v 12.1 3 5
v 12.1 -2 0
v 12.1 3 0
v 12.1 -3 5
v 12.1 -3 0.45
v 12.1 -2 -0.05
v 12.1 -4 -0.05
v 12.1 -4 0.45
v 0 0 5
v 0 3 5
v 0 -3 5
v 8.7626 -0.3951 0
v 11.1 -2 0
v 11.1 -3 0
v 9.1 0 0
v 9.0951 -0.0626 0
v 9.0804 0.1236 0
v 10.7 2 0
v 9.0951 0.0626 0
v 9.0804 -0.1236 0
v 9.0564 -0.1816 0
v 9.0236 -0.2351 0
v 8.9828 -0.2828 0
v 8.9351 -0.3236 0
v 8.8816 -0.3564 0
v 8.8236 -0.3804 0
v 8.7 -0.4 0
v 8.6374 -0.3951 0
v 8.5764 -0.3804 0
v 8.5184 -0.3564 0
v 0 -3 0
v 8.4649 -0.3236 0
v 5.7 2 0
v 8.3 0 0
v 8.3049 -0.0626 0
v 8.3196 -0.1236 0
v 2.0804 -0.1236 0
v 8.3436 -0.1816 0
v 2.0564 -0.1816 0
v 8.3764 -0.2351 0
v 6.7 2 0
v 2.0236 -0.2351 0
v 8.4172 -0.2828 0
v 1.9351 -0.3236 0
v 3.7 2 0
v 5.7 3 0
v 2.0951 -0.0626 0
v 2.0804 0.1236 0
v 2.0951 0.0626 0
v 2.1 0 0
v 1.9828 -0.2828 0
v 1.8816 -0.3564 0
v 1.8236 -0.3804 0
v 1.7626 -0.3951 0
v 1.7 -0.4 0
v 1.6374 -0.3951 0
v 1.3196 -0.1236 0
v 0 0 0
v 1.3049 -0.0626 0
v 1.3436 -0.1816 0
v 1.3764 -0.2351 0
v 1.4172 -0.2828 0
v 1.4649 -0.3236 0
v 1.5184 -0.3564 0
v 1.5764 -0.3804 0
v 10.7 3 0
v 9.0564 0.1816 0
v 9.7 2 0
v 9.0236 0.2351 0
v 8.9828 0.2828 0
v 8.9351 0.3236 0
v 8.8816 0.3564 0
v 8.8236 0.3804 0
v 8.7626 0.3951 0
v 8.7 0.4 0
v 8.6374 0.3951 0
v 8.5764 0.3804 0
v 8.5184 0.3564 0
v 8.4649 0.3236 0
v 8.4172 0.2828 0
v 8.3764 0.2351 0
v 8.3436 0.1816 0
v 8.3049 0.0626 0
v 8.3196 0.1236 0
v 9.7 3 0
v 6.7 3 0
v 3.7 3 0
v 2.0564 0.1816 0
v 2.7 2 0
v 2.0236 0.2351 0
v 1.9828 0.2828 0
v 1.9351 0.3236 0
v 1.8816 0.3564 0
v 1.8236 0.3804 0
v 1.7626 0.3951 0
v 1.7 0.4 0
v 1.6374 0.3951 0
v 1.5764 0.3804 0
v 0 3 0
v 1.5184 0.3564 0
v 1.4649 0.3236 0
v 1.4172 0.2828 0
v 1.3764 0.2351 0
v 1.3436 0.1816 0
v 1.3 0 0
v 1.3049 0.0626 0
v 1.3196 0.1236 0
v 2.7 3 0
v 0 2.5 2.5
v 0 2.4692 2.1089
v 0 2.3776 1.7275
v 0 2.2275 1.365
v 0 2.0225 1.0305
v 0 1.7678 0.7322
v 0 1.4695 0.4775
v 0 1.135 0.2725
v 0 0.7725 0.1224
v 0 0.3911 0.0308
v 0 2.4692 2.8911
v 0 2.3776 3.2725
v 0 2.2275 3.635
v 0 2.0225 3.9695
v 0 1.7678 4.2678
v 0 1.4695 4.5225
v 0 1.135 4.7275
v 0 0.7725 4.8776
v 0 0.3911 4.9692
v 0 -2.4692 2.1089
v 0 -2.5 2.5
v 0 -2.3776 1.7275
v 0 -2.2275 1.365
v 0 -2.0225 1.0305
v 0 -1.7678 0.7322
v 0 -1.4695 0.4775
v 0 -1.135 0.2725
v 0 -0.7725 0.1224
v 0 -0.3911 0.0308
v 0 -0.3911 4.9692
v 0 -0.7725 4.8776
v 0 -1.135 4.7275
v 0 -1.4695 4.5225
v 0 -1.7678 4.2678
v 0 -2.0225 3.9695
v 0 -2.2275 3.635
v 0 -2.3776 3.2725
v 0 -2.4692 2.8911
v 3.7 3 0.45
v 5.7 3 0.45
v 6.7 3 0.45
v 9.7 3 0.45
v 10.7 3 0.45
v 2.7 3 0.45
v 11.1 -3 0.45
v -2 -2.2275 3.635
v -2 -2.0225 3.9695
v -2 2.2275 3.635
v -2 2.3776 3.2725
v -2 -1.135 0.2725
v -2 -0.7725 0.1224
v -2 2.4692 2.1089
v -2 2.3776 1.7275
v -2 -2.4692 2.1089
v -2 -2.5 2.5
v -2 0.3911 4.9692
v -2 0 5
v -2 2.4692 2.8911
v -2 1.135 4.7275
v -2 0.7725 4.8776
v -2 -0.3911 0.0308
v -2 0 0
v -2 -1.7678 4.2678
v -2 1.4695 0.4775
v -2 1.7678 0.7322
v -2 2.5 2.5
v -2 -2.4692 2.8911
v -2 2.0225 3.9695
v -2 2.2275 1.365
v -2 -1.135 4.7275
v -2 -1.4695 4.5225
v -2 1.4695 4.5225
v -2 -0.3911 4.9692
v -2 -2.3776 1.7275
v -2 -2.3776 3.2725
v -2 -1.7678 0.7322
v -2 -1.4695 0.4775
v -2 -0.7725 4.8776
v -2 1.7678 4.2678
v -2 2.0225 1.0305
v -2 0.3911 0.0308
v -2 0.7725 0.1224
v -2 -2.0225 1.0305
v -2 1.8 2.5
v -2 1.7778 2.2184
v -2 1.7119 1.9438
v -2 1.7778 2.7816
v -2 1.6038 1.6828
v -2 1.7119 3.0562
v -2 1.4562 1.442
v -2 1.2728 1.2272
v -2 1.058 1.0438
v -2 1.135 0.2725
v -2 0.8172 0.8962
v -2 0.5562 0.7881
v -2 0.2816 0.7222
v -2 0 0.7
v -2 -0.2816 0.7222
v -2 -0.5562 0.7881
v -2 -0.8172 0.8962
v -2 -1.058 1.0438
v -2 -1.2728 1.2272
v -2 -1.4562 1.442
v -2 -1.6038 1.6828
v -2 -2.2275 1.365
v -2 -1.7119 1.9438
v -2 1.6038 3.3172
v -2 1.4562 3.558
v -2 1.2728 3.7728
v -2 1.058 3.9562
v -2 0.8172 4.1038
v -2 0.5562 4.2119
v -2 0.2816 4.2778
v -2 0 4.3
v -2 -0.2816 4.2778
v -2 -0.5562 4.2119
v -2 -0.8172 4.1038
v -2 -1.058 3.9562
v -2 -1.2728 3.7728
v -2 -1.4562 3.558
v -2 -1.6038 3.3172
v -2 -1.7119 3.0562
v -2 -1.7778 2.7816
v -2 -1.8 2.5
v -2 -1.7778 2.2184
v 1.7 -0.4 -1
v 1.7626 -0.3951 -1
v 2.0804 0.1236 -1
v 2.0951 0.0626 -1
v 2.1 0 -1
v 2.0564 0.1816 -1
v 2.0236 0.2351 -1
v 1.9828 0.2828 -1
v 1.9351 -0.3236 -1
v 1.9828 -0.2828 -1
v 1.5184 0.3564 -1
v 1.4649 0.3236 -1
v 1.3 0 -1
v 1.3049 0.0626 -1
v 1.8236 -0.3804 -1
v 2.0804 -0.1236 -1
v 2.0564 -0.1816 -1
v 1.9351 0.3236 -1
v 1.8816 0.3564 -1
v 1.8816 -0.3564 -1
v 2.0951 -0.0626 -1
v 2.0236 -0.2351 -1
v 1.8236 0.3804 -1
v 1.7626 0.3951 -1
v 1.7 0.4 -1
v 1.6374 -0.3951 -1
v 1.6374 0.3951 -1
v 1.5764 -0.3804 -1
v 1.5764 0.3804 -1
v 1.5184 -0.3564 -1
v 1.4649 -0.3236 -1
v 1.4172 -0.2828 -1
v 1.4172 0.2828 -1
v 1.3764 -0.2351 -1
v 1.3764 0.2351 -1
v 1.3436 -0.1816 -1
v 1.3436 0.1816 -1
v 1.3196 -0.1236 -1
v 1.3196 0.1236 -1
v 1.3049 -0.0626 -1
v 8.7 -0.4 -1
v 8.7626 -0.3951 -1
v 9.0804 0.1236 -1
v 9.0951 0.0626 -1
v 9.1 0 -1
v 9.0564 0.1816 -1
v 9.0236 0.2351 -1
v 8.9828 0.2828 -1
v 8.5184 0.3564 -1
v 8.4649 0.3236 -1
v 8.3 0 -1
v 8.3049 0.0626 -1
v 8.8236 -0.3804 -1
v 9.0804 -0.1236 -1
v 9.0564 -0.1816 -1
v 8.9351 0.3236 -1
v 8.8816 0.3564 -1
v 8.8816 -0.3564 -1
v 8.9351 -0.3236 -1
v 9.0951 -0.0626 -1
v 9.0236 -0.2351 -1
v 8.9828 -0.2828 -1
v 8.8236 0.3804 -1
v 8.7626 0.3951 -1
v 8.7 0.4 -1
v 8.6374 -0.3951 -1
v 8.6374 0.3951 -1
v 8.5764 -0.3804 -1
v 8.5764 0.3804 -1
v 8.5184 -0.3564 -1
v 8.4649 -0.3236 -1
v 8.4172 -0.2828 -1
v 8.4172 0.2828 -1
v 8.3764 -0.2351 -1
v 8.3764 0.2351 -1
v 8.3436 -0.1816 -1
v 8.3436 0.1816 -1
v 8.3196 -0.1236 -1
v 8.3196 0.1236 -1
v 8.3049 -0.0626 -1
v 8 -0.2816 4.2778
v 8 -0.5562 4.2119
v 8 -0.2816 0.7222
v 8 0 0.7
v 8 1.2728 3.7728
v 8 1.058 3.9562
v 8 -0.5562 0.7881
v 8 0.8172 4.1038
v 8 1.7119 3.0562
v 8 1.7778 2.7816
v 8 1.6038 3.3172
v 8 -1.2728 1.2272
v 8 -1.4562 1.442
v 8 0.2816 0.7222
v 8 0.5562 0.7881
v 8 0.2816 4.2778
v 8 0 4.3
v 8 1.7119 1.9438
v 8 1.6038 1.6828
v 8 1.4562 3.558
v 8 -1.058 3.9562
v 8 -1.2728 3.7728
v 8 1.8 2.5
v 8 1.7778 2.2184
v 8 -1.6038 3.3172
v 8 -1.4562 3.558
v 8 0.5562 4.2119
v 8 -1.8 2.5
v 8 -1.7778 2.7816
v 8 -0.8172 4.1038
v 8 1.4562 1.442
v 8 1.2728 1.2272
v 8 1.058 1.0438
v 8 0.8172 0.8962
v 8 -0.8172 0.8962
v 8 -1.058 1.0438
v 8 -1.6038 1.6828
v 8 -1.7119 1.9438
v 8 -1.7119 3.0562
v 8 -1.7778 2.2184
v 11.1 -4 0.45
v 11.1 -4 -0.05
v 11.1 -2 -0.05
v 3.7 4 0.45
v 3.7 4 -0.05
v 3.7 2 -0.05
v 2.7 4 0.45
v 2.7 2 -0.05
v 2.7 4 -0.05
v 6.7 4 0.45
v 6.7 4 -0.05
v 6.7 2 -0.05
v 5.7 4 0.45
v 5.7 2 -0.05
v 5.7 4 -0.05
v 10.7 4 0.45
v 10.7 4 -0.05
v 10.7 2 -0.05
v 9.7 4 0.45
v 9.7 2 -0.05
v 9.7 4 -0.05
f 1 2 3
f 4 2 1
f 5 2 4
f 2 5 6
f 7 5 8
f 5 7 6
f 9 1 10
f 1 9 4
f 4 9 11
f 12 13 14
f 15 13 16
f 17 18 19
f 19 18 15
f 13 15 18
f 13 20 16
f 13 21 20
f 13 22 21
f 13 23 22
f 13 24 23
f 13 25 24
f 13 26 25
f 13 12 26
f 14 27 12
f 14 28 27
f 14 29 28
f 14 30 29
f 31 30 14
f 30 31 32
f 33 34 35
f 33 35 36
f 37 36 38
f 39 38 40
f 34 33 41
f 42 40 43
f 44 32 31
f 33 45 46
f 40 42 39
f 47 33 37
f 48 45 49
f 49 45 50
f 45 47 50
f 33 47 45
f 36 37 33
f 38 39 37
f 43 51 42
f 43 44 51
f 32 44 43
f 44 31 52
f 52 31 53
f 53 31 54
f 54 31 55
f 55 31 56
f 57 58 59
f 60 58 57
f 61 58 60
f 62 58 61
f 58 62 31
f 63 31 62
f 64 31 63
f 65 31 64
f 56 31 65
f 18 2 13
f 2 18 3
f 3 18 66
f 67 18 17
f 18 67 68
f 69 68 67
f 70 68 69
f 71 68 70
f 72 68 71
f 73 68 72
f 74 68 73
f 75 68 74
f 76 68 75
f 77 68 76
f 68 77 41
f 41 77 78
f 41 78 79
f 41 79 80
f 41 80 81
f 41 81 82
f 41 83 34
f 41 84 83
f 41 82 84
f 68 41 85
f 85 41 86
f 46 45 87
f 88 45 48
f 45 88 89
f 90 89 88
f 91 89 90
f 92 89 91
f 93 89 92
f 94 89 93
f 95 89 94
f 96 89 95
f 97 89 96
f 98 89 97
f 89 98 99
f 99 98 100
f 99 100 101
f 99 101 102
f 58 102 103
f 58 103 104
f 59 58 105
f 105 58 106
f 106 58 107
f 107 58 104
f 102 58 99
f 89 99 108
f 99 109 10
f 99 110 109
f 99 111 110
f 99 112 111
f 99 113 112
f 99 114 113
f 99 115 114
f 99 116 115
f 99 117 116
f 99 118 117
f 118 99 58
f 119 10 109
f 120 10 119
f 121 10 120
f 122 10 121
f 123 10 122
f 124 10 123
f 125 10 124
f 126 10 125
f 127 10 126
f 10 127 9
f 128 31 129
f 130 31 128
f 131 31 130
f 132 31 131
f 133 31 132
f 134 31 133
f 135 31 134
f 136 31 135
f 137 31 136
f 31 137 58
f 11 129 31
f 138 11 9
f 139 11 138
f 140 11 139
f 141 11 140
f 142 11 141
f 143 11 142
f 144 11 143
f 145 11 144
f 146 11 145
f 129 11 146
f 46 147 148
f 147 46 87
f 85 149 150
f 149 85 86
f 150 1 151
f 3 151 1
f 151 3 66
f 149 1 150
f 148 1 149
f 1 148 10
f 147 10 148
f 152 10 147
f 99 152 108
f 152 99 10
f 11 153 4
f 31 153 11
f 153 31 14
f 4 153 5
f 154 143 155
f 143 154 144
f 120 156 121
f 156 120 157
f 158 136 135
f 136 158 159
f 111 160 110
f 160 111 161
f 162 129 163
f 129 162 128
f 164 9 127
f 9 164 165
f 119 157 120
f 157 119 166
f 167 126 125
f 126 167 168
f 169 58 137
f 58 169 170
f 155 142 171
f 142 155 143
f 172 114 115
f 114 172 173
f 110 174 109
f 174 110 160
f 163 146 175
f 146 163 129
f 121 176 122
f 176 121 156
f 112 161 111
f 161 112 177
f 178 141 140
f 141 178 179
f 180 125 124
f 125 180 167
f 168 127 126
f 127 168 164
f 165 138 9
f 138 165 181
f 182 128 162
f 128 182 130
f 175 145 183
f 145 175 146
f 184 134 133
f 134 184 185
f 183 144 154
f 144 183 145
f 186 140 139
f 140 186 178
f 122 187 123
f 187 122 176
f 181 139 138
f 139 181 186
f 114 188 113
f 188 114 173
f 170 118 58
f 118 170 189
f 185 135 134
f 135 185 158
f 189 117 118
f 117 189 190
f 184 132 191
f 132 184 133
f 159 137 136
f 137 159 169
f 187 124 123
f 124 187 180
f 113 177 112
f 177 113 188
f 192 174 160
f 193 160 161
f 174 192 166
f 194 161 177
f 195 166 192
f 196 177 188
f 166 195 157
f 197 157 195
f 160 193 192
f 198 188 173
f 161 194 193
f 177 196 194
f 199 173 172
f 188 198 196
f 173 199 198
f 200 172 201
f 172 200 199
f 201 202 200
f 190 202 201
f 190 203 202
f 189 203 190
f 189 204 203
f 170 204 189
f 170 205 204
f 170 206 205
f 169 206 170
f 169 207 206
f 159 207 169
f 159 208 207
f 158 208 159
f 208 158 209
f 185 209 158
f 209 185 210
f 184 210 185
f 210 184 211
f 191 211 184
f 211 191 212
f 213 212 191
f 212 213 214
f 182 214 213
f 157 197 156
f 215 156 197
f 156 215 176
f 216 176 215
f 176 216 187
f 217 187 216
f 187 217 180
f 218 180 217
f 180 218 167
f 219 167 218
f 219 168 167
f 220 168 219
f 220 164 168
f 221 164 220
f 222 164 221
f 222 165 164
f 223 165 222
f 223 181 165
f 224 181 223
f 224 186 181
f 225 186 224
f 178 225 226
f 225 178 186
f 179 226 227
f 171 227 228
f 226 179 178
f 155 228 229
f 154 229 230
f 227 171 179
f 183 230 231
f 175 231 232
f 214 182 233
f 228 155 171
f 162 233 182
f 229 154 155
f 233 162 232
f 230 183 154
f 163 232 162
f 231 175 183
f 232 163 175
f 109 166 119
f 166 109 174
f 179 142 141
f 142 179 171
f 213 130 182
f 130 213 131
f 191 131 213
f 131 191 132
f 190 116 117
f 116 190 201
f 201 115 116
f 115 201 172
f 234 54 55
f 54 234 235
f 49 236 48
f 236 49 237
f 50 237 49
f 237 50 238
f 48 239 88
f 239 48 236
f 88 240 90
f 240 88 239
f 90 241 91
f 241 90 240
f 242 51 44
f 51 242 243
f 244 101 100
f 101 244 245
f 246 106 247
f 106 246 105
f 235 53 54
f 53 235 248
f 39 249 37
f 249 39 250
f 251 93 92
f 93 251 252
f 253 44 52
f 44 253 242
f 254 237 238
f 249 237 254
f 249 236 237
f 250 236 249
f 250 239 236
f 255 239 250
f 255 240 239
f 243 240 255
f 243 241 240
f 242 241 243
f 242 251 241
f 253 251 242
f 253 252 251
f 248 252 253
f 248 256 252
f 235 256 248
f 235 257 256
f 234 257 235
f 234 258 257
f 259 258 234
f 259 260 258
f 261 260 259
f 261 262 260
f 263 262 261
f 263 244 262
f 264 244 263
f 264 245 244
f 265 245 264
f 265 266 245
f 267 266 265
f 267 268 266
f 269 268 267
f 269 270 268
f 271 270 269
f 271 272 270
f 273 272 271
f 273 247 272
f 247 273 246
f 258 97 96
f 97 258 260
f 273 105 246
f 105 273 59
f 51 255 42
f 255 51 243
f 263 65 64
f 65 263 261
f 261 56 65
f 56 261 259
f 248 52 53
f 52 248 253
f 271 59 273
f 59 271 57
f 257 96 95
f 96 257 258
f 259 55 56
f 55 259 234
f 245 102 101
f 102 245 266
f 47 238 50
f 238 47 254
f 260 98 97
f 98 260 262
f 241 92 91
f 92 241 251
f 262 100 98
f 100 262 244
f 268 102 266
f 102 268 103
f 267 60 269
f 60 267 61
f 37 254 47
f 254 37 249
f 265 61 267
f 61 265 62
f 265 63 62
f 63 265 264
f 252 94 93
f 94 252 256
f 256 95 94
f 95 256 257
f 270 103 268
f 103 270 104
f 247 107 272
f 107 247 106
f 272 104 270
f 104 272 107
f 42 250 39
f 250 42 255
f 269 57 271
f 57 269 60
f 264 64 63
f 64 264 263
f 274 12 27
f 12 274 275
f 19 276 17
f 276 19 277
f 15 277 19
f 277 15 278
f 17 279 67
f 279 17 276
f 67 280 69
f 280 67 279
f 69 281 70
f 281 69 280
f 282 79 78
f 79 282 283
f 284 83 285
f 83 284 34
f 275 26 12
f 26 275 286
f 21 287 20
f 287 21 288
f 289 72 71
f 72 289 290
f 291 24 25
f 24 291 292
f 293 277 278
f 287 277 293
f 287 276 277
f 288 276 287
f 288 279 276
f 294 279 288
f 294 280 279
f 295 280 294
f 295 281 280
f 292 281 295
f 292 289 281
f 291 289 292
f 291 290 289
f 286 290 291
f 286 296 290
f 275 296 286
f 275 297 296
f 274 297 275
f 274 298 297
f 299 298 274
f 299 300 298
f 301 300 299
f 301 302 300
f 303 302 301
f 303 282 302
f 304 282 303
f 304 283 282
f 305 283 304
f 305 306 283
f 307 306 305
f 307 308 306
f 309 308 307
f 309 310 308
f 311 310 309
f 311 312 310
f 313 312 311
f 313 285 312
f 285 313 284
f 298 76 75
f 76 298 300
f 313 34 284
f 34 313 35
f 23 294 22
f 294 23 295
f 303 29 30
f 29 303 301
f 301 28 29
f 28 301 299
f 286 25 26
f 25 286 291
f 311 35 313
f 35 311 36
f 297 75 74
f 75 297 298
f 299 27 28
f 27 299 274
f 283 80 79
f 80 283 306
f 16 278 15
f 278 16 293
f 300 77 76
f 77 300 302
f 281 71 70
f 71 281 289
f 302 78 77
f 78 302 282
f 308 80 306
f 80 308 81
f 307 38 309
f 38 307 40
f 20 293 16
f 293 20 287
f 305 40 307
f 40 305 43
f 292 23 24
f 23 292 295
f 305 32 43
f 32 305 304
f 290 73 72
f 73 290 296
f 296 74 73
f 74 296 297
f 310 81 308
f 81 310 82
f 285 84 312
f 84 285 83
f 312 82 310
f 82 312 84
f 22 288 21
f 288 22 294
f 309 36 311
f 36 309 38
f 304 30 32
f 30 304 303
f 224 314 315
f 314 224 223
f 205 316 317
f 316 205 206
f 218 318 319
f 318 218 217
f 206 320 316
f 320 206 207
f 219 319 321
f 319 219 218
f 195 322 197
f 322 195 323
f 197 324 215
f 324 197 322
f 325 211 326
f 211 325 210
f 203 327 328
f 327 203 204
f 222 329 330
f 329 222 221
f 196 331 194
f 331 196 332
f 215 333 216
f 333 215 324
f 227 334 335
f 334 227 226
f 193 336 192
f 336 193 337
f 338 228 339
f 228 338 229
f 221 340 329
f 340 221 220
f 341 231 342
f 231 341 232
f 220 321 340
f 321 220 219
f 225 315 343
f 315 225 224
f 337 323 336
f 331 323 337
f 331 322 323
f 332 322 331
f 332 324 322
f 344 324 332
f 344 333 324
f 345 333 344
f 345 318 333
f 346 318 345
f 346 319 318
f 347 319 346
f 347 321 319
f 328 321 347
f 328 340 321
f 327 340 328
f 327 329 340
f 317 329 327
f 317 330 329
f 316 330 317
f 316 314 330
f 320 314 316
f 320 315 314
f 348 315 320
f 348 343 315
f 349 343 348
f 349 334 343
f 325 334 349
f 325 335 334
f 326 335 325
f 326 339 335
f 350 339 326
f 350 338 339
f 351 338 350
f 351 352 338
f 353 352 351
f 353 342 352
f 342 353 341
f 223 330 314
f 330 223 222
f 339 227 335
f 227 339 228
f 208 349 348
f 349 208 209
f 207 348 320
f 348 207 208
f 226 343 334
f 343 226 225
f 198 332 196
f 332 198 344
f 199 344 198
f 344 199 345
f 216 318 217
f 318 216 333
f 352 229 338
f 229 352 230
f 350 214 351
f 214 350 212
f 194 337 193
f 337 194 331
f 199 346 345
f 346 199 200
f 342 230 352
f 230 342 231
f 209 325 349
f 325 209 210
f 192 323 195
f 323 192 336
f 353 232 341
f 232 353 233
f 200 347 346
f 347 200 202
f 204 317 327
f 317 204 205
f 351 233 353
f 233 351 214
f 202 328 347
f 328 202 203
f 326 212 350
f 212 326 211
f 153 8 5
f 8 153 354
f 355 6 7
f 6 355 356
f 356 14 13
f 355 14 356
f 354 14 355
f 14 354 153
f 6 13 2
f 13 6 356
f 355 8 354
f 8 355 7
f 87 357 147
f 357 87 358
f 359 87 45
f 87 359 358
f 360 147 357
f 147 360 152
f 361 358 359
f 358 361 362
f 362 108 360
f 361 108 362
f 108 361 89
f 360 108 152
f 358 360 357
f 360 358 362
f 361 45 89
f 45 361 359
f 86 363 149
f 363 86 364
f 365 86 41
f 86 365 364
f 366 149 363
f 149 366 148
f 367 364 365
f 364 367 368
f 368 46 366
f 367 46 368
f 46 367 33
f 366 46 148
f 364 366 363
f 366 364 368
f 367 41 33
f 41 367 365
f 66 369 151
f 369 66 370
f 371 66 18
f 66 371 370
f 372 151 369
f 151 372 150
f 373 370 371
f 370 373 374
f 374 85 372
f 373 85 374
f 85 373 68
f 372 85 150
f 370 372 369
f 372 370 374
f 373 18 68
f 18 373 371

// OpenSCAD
$fn=40;

black = [0.2,0.2,0.2];
silver = [0.75,0.75,0.75];

// The model is centered on the front
// as per the data sheet, but with the
// cylinder sticking out 2mm, so 0,0
// is where the cube body starts
// (datasheet numbers are relative to
// the 2mm tip of the cylinder)

pins = [ [11.6,-3], [3.2, 3], [6.2, 3], [10.2, 3] ];

module body()
{
	difference() {
		union() {
			translate([0,-3,0]) cube([12.1, 6, 5]);
			translate([0,0,2.5]) rotate([0,-90,0]) cylinder(h=4,d=5, center=true);
			translate([1.7,0,0]) cylinder(d=0.8,h=2,center=true);
			translate([8.7,0,0]) cylinder(d=0.8,h=2,center=true);
		}
		translate([8,0,2.5]) rotate([0,-90,0])
			cylinder(12,d=3.6);
	}
}

module pj320d()
{
	color(black)
		body();

	// Pads
	color(silver) for (pos = pins)
		translate(pos) translate([0,0,0.2]) cube([1,2,0.5], center=true);
}

pj320d();
